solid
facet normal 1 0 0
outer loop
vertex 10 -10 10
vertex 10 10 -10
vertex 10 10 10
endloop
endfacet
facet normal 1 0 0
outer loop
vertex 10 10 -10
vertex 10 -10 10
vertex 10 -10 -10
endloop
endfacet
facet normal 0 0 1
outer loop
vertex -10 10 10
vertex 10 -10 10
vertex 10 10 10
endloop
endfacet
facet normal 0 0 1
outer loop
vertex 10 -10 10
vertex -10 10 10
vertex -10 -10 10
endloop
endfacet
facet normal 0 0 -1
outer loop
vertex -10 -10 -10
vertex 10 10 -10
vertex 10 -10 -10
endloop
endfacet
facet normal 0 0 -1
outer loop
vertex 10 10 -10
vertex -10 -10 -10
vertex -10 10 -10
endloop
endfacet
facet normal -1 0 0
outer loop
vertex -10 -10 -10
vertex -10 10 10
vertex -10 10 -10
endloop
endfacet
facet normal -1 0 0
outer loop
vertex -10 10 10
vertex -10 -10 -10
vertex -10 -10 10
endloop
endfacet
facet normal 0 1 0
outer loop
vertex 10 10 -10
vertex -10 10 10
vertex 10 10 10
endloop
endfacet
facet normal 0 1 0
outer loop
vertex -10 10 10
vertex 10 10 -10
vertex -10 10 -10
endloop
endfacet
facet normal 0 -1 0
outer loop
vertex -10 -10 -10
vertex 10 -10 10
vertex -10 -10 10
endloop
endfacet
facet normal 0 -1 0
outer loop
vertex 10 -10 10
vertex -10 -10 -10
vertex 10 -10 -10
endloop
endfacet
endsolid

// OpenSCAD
//Translate ()
x=20;
y=20;
z=20;
espesor=5;

cube([x,y,z],center=true);
difference(){
    cube([x,y,z],center=true);
    
    cube([x-espesor,y-espesor,z-espesor],center=true);
    
    translate([0,0,z/2])
    cube([x-espesor,y-espesor,z-espesor],center=true);
}
